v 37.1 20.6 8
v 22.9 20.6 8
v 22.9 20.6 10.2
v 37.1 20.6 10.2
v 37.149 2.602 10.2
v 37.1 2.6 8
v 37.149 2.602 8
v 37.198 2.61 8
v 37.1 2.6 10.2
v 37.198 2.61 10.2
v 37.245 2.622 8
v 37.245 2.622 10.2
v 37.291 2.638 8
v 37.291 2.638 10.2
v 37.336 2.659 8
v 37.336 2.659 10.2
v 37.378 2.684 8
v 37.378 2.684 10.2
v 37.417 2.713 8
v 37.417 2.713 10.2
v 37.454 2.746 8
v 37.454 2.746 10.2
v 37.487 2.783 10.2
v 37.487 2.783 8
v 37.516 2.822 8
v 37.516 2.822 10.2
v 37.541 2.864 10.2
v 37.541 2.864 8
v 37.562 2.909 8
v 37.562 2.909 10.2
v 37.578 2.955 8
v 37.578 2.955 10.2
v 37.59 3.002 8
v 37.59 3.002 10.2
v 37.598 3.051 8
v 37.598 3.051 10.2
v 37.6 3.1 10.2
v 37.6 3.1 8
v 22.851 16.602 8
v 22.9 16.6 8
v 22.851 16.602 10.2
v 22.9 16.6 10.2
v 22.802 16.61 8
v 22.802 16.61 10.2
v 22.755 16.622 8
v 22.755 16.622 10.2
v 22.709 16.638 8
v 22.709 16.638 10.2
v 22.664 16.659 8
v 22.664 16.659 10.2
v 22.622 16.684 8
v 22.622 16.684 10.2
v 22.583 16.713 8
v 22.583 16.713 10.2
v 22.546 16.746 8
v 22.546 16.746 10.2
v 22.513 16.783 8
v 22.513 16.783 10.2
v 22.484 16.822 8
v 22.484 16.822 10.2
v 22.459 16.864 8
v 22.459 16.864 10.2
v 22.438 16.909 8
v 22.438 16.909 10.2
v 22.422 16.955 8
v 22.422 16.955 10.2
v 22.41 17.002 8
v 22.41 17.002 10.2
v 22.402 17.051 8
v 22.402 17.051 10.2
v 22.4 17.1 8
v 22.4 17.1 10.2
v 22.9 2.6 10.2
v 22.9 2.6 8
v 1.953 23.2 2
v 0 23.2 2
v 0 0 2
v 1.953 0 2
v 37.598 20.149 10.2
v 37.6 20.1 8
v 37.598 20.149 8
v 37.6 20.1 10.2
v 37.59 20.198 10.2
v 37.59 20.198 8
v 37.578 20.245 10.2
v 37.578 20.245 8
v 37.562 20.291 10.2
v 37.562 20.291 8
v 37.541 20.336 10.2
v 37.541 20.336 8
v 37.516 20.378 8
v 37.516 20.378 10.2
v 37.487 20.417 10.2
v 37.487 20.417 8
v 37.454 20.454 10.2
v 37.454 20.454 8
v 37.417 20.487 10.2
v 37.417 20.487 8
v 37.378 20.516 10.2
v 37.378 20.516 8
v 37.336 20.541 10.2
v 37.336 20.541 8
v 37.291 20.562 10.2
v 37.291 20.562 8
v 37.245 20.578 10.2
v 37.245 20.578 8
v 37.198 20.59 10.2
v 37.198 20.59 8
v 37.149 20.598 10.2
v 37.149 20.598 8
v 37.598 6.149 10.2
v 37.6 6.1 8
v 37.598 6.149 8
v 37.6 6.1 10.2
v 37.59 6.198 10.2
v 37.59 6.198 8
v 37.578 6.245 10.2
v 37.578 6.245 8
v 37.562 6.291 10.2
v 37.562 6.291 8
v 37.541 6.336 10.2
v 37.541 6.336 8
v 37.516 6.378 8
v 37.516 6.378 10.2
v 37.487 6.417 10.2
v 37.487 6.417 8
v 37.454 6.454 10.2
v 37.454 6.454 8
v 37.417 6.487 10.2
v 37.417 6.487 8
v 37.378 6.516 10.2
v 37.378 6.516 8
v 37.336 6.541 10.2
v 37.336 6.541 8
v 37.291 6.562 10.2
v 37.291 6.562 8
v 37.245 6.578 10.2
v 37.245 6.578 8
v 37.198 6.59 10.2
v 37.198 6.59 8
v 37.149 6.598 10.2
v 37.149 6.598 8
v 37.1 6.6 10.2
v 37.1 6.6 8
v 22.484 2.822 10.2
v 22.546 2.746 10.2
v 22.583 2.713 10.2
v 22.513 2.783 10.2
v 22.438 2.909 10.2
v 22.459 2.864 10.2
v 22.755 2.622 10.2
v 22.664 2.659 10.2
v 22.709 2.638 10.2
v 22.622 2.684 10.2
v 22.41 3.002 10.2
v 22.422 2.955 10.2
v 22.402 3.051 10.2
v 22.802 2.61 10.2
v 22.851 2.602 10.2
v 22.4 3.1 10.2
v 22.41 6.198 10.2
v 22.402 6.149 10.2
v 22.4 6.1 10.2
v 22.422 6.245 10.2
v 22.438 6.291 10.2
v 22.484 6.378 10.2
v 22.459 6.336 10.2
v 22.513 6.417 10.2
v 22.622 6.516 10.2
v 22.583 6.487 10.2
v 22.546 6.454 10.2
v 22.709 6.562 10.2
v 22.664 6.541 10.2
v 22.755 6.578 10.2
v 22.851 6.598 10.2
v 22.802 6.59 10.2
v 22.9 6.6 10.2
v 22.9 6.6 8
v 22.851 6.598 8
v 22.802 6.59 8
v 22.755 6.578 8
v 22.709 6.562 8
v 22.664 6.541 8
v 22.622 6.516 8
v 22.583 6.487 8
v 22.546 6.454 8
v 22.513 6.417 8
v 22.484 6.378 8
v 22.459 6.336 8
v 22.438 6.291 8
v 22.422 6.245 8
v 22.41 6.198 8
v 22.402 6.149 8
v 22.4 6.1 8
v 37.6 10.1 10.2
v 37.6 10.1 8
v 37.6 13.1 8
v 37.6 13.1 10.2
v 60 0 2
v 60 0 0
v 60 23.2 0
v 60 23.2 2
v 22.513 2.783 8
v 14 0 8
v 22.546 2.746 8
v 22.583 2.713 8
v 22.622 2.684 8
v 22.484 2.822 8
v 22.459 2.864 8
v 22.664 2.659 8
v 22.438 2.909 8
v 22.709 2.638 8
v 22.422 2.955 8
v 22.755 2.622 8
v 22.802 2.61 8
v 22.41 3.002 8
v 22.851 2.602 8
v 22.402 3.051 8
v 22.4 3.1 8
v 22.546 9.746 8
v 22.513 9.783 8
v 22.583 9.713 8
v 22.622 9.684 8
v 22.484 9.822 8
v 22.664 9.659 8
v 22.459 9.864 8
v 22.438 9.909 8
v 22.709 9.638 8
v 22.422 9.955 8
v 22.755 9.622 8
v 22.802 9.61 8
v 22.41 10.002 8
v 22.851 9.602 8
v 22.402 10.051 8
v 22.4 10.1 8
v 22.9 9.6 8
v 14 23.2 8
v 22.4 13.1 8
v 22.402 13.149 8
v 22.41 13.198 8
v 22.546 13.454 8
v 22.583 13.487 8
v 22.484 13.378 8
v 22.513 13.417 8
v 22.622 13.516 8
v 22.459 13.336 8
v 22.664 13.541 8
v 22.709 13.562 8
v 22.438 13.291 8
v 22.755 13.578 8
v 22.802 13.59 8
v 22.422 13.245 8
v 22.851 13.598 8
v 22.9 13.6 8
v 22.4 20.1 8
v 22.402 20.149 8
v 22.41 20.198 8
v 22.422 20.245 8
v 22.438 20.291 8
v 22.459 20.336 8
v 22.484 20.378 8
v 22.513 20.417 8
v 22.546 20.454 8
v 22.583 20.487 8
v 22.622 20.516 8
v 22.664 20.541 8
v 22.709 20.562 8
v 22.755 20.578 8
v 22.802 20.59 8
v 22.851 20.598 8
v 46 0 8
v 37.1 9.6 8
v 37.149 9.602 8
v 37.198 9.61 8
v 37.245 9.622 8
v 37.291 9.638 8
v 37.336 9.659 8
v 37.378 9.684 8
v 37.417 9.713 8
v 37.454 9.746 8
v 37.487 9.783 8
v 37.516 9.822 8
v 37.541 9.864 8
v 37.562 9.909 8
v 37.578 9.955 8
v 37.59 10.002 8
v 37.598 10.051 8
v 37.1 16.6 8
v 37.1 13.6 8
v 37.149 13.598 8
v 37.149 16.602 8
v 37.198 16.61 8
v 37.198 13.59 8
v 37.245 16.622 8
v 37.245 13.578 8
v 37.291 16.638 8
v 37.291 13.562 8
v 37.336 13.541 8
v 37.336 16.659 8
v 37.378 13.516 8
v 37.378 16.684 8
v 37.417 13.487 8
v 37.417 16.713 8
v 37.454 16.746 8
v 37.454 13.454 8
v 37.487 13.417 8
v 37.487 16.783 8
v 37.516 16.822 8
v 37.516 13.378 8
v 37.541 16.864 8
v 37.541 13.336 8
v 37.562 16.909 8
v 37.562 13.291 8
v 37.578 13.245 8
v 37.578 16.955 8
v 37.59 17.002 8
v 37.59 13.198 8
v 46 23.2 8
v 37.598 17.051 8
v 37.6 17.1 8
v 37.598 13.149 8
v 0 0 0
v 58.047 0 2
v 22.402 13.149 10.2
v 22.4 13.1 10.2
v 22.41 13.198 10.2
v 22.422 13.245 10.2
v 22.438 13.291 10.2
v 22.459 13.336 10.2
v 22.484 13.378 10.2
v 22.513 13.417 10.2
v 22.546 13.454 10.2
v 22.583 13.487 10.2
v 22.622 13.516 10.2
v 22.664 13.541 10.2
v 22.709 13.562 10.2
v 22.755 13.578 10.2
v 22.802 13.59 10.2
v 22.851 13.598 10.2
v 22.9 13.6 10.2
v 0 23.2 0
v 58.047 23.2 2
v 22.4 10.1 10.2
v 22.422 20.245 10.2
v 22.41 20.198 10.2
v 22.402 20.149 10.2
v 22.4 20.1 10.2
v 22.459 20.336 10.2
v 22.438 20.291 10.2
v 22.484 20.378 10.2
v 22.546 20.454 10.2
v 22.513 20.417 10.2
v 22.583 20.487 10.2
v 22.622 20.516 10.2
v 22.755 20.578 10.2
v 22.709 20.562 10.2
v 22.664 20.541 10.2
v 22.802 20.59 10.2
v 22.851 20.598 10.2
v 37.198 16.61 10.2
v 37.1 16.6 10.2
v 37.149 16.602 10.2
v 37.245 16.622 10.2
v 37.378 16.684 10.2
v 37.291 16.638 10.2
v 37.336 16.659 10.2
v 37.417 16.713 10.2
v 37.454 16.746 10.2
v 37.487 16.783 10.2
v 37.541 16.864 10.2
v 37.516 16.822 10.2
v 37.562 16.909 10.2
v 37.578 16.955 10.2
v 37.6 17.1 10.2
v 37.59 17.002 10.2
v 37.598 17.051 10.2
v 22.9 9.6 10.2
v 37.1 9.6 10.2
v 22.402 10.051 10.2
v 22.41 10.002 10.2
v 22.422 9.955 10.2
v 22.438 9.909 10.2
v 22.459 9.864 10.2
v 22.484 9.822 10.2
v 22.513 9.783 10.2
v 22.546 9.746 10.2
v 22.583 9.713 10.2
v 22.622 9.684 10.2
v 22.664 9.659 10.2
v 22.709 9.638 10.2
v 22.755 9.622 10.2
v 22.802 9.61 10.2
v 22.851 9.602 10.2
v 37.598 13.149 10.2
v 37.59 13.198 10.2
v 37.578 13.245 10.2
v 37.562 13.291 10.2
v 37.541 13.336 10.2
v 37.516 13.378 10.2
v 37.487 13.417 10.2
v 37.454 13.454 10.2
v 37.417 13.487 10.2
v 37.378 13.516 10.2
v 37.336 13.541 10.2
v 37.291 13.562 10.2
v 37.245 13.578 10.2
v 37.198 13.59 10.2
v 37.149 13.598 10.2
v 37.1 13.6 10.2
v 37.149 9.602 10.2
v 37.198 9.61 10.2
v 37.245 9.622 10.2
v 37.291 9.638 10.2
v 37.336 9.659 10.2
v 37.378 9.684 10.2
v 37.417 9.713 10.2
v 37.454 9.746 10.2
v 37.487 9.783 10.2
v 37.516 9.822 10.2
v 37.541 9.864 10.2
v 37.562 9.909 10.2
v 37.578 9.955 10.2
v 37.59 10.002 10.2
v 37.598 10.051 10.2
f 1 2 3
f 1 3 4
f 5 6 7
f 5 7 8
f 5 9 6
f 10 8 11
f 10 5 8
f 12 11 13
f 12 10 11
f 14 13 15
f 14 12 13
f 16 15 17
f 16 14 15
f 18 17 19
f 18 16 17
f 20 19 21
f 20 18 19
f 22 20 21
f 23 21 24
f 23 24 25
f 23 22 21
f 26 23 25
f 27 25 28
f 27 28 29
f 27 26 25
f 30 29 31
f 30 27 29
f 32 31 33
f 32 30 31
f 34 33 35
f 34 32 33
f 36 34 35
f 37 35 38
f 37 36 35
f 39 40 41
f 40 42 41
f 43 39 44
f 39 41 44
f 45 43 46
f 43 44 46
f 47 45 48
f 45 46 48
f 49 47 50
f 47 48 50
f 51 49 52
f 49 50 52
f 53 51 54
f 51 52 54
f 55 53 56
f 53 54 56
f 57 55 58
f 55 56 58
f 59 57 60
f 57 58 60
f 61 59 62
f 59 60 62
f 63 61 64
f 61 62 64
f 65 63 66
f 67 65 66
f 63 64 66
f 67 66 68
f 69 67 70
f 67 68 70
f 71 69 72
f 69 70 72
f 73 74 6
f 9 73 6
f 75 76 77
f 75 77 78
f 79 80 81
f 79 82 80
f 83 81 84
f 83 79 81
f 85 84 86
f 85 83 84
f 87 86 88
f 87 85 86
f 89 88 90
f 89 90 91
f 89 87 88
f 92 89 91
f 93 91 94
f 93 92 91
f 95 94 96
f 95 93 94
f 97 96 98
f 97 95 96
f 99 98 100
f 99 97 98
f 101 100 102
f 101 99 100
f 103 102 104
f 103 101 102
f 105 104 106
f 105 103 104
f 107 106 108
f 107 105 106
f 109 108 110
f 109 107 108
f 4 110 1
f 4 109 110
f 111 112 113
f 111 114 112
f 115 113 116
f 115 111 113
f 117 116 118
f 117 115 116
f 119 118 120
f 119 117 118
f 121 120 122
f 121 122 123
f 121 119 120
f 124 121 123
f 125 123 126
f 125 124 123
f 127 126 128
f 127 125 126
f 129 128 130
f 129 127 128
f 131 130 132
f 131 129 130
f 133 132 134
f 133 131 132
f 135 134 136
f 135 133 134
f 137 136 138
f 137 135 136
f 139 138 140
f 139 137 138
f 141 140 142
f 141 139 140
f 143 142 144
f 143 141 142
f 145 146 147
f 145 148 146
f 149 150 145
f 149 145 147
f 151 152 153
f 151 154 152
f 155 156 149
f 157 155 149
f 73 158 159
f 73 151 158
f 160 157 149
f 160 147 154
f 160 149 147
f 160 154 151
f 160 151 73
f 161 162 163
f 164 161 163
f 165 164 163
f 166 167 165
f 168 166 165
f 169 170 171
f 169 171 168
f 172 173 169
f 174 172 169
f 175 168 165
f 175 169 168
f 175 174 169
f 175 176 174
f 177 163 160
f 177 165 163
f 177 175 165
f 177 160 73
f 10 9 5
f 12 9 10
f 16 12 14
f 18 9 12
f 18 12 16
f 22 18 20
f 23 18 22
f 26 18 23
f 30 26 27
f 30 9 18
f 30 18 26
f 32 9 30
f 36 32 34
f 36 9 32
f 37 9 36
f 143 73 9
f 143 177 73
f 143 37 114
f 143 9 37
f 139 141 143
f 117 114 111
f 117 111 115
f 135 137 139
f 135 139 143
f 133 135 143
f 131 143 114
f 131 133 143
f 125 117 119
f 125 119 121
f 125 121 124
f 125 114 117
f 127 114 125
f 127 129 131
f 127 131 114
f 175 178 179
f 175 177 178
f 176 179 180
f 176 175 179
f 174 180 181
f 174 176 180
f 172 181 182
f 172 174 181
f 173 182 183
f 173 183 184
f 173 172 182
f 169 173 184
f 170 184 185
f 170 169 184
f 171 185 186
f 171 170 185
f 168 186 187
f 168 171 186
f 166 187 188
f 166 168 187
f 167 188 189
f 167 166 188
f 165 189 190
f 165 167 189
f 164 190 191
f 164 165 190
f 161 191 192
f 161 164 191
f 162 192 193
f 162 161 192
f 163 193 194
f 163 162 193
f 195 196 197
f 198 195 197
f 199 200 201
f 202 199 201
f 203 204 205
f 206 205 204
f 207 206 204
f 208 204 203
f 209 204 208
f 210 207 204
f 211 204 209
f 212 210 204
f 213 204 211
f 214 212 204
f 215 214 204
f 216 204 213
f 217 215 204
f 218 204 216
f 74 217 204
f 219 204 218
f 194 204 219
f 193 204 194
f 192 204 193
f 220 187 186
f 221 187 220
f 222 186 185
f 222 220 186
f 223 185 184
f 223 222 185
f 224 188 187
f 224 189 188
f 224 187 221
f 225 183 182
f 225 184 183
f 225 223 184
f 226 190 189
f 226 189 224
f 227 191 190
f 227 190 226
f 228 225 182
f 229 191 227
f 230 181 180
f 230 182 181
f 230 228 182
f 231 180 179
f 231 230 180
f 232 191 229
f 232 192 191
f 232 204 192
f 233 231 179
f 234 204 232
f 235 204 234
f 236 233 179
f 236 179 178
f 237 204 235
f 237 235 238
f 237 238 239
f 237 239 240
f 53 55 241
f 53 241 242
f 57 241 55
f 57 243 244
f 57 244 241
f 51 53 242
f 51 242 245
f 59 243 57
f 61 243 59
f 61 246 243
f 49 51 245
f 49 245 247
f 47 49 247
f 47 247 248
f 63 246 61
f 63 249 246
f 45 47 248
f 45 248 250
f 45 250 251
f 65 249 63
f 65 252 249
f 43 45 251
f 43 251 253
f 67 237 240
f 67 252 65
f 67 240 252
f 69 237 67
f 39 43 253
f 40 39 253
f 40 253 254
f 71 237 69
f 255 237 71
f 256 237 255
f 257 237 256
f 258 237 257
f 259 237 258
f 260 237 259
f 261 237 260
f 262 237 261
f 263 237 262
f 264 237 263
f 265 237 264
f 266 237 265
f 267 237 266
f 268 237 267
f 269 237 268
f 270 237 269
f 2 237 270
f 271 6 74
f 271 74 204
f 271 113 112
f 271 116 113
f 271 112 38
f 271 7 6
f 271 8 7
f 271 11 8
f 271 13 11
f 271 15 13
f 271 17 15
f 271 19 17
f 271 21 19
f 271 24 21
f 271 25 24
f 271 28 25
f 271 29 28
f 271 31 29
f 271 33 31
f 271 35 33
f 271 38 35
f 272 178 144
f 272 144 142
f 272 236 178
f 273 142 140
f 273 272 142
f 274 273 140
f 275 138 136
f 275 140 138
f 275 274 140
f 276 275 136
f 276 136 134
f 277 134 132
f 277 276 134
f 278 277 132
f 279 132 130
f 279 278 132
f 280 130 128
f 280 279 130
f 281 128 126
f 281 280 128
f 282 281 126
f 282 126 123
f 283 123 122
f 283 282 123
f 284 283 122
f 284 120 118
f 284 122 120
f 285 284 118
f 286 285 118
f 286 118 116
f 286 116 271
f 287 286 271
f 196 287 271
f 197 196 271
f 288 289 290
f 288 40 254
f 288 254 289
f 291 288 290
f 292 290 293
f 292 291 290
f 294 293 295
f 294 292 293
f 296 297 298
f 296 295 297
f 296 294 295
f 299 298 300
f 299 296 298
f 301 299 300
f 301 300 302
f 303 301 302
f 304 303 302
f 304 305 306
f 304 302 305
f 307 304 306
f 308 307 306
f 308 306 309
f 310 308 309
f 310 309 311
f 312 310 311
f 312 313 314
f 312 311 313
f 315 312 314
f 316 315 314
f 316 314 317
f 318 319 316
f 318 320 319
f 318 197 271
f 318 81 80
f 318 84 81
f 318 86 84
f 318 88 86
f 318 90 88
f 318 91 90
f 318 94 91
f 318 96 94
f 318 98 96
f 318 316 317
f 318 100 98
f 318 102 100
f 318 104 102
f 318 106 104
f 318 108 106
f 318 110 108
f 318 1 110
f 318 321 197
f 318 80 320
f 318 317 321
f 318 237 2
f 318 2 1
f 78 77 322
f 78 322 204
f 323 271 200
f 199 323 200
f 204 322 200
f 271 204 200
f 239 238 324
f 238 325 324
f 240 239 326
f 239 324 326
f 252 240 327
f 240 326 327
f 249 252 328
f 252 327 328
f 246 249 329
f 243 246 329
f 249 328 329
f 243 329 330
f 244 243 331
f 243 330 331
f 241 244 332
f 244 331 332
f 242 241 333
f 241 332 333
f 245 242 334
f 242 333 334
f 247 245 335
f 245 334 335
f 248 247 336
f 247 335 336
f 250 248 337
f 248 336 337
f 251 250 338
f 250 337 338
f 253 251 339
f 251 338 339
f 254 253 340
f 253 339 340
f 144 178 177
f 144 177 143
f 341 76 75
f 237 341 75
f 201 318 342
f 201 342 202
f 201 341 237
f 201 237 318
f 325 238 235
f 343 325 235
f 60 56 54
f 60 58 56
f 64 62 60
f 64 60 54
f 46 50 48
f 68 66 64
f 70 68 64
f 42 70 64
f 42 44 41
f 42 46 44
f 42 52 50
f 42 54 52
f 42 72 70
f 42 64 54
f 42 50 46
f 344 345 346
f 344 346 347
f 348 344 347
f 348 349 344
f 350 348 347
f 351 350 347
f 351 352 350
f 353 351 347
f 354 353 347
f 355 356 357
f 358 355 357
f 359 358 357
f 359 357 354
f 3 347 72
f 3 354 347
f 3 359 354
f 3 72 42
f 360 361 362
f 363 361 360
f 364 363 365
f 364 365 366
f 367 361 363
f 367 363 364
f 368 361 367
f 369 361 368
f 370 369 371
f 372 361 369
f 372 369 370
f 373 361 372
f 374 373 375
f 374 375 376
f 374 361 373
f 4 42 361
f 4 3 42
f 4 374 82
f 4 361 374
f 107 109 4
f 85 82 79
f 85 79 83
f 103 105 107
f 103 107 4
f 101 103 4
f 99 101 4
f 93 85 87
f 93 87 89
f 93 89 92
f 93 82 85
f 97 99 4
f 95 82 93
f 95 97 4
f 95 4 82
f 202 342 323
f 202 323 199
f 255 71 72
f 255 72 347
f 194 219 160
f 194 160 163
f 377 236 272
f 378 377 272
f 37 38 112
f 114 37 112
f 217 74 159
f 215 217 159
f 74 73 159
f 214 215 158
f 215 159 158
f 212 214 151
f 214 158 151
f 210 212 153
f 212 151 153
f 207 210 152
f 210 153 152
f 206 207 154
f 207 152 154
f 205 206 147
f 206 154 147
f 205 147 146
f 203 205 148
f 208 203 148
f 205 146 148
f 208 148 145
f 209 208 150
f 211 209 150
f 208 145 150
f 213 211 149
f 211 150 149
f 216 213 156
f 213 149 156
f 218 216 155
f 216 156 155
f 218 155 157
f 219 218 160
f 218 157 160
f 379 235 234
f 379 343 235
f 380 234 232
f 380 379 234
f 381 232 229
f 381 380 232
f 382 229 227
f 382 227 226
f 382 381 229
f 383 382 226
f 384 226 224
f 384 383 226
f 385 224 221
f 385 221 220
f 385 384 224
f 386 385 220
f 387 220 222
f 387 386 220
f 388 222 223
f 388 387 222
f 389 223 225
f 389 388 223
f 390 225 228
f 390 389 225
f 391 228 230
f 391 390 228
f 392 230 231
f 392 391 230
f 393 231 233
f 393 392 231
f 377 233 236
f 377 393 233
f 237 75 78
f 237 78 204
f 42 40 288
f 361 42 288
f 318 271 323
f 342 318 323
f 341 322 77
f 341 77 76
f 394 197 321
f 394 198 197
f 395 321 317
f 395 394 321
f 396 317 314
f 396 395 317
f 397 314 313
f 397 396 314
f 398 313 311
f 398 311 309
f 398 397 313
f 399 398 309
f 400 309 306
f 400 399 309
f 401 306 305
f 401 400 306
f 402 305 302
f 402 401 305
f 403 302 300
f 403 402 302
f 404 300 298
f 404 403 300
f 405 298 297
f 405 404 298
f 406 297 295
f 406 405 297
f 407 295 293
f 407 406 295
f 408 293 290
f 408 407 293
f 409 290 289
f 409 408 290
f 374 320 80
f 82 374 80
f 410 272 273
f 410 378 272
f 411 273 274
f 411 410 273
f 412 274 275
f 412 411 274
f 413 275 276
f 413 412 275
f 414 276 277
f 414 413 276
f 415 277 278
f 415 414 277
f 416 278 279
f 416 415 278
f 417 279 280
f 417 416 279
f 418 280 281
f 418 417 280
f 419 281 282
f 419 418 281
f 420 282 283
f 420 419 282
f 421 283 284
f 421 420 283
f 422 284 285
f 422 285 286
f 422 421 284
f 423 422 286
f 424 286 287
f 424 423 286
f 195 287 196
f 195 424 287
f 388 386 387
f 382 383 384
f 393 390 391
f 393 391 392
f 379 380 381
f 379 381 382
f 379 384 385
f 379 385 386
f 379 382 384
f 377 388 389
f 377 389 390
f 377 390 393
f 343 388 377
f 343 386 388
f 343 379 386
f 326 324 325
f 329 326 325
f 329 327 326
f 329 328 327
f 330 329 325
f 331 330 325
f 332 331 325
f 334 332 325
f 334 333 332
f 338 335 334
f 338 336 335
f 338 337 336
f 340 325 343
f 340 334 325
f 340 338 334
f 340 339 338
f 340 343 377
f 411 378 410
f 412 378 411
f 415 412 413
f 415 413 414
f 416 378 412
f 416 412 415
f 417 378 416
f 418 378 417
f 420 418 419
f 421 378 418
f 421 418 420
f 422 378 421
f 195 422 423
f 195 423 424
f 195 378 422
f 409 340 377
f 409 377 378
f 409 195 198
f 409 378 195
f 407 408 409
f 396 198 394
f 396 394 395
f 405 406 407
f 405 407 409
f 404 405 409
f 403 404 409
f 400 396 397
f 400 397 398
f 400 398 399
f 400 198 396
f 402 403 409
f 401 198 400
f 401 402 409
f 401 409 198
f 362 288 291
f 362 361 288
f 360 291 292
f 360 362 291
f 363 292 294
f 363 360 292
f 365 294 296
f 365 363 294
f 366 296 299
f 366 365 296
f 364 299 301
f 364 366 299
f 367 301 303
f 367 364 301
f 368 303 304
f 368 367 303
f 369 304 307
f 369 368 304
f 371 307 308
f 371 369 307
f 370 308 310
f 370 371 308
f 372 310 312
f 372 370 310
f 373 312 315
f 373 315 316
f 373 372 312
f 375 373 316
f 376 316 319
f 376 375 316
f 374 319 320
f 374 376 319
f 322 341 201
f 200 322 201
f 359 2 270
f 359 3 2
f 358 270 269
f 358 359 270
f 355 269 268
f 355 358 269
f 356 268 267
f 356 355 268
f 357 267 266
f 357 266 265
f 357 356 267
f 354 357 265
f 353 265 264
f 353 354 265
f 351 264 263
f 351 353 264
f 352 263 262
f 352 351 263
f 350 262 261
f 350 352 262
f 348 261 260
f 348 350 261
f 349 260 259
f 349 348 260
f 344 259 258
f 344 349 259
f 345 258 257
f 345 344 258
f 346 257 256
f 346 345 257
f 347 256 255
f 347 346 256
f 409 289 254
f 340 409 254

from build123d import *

# Parameters (mm, degrees)
F0_W     = 60
F0_H     = 23.2
F1_DEPTH = 2
F3_DEPTH = 23.2
F4_W     = 15.2
F4_H     = 4
F5_DEPTH = 2.2
F6_R     = 0.5


with BuildPart() as f1:
    # F0 (on Top) → F1 (new body)
    with BuildSketch(Plane.XY):
        with Locations((30, 11.6)):
            Rectangle(F0_W, F0_H)
    extrude(amount=F1_DEPTH)

    # F2 (on face) → F3 (join, through all)
    with BuildSketch(Plane(origin=(0, 23.2, 0), x_dir=(-1, 0, 0), z_dir=(0, 1, 0))):
        Polygon((-1.952949, 2), (-14, 8), (-46, 8), (-58.047051, 2), align=None)
    extrude(amount=-F3_DEPTH)

    # F4 (on face) → F5 (join)
    with BuildSketch(Plane.XY.offset(8)):
        with Locations((30, 18.6)):
            Rectangle(F4_W, F4_H)
        Polygon((22.4, 13.6), (22.4, 11.6), (22.4, 9.6), (37.6, 9.6), (37.6, 11.6), (37.6, 13.6), align=None)
        with Locations((30, 4.6)):
            Rectangle(F4_W, F4_H)
    extrude(amount=F5_DEPTH)

    # F6
    f6_edges = [f1.edges().sort_by_distance(p)[0] for p in [
        (22.4, 16.6, 9.1),
        (22.4, 9.6, 9.1),
        (22.4, 2.6, 9.1),
        (37.6, 2.6, 9.1),
        (37.6, 9.6, 9.1),
        (37.6, 16.6, 9.1),
        (22.4, 6.6, 9.1),
        (37.6, 6.6, 9.1),
        (37.6, 13.6, 9.1),
        (22.4, 13.6, 9.1),
        (22.4, 20.6, 9.1),
        (37.6, 20.6, 9.1),
    ]]
    fillet(f6_edges, radius=F6_R)


solid = f1.part
